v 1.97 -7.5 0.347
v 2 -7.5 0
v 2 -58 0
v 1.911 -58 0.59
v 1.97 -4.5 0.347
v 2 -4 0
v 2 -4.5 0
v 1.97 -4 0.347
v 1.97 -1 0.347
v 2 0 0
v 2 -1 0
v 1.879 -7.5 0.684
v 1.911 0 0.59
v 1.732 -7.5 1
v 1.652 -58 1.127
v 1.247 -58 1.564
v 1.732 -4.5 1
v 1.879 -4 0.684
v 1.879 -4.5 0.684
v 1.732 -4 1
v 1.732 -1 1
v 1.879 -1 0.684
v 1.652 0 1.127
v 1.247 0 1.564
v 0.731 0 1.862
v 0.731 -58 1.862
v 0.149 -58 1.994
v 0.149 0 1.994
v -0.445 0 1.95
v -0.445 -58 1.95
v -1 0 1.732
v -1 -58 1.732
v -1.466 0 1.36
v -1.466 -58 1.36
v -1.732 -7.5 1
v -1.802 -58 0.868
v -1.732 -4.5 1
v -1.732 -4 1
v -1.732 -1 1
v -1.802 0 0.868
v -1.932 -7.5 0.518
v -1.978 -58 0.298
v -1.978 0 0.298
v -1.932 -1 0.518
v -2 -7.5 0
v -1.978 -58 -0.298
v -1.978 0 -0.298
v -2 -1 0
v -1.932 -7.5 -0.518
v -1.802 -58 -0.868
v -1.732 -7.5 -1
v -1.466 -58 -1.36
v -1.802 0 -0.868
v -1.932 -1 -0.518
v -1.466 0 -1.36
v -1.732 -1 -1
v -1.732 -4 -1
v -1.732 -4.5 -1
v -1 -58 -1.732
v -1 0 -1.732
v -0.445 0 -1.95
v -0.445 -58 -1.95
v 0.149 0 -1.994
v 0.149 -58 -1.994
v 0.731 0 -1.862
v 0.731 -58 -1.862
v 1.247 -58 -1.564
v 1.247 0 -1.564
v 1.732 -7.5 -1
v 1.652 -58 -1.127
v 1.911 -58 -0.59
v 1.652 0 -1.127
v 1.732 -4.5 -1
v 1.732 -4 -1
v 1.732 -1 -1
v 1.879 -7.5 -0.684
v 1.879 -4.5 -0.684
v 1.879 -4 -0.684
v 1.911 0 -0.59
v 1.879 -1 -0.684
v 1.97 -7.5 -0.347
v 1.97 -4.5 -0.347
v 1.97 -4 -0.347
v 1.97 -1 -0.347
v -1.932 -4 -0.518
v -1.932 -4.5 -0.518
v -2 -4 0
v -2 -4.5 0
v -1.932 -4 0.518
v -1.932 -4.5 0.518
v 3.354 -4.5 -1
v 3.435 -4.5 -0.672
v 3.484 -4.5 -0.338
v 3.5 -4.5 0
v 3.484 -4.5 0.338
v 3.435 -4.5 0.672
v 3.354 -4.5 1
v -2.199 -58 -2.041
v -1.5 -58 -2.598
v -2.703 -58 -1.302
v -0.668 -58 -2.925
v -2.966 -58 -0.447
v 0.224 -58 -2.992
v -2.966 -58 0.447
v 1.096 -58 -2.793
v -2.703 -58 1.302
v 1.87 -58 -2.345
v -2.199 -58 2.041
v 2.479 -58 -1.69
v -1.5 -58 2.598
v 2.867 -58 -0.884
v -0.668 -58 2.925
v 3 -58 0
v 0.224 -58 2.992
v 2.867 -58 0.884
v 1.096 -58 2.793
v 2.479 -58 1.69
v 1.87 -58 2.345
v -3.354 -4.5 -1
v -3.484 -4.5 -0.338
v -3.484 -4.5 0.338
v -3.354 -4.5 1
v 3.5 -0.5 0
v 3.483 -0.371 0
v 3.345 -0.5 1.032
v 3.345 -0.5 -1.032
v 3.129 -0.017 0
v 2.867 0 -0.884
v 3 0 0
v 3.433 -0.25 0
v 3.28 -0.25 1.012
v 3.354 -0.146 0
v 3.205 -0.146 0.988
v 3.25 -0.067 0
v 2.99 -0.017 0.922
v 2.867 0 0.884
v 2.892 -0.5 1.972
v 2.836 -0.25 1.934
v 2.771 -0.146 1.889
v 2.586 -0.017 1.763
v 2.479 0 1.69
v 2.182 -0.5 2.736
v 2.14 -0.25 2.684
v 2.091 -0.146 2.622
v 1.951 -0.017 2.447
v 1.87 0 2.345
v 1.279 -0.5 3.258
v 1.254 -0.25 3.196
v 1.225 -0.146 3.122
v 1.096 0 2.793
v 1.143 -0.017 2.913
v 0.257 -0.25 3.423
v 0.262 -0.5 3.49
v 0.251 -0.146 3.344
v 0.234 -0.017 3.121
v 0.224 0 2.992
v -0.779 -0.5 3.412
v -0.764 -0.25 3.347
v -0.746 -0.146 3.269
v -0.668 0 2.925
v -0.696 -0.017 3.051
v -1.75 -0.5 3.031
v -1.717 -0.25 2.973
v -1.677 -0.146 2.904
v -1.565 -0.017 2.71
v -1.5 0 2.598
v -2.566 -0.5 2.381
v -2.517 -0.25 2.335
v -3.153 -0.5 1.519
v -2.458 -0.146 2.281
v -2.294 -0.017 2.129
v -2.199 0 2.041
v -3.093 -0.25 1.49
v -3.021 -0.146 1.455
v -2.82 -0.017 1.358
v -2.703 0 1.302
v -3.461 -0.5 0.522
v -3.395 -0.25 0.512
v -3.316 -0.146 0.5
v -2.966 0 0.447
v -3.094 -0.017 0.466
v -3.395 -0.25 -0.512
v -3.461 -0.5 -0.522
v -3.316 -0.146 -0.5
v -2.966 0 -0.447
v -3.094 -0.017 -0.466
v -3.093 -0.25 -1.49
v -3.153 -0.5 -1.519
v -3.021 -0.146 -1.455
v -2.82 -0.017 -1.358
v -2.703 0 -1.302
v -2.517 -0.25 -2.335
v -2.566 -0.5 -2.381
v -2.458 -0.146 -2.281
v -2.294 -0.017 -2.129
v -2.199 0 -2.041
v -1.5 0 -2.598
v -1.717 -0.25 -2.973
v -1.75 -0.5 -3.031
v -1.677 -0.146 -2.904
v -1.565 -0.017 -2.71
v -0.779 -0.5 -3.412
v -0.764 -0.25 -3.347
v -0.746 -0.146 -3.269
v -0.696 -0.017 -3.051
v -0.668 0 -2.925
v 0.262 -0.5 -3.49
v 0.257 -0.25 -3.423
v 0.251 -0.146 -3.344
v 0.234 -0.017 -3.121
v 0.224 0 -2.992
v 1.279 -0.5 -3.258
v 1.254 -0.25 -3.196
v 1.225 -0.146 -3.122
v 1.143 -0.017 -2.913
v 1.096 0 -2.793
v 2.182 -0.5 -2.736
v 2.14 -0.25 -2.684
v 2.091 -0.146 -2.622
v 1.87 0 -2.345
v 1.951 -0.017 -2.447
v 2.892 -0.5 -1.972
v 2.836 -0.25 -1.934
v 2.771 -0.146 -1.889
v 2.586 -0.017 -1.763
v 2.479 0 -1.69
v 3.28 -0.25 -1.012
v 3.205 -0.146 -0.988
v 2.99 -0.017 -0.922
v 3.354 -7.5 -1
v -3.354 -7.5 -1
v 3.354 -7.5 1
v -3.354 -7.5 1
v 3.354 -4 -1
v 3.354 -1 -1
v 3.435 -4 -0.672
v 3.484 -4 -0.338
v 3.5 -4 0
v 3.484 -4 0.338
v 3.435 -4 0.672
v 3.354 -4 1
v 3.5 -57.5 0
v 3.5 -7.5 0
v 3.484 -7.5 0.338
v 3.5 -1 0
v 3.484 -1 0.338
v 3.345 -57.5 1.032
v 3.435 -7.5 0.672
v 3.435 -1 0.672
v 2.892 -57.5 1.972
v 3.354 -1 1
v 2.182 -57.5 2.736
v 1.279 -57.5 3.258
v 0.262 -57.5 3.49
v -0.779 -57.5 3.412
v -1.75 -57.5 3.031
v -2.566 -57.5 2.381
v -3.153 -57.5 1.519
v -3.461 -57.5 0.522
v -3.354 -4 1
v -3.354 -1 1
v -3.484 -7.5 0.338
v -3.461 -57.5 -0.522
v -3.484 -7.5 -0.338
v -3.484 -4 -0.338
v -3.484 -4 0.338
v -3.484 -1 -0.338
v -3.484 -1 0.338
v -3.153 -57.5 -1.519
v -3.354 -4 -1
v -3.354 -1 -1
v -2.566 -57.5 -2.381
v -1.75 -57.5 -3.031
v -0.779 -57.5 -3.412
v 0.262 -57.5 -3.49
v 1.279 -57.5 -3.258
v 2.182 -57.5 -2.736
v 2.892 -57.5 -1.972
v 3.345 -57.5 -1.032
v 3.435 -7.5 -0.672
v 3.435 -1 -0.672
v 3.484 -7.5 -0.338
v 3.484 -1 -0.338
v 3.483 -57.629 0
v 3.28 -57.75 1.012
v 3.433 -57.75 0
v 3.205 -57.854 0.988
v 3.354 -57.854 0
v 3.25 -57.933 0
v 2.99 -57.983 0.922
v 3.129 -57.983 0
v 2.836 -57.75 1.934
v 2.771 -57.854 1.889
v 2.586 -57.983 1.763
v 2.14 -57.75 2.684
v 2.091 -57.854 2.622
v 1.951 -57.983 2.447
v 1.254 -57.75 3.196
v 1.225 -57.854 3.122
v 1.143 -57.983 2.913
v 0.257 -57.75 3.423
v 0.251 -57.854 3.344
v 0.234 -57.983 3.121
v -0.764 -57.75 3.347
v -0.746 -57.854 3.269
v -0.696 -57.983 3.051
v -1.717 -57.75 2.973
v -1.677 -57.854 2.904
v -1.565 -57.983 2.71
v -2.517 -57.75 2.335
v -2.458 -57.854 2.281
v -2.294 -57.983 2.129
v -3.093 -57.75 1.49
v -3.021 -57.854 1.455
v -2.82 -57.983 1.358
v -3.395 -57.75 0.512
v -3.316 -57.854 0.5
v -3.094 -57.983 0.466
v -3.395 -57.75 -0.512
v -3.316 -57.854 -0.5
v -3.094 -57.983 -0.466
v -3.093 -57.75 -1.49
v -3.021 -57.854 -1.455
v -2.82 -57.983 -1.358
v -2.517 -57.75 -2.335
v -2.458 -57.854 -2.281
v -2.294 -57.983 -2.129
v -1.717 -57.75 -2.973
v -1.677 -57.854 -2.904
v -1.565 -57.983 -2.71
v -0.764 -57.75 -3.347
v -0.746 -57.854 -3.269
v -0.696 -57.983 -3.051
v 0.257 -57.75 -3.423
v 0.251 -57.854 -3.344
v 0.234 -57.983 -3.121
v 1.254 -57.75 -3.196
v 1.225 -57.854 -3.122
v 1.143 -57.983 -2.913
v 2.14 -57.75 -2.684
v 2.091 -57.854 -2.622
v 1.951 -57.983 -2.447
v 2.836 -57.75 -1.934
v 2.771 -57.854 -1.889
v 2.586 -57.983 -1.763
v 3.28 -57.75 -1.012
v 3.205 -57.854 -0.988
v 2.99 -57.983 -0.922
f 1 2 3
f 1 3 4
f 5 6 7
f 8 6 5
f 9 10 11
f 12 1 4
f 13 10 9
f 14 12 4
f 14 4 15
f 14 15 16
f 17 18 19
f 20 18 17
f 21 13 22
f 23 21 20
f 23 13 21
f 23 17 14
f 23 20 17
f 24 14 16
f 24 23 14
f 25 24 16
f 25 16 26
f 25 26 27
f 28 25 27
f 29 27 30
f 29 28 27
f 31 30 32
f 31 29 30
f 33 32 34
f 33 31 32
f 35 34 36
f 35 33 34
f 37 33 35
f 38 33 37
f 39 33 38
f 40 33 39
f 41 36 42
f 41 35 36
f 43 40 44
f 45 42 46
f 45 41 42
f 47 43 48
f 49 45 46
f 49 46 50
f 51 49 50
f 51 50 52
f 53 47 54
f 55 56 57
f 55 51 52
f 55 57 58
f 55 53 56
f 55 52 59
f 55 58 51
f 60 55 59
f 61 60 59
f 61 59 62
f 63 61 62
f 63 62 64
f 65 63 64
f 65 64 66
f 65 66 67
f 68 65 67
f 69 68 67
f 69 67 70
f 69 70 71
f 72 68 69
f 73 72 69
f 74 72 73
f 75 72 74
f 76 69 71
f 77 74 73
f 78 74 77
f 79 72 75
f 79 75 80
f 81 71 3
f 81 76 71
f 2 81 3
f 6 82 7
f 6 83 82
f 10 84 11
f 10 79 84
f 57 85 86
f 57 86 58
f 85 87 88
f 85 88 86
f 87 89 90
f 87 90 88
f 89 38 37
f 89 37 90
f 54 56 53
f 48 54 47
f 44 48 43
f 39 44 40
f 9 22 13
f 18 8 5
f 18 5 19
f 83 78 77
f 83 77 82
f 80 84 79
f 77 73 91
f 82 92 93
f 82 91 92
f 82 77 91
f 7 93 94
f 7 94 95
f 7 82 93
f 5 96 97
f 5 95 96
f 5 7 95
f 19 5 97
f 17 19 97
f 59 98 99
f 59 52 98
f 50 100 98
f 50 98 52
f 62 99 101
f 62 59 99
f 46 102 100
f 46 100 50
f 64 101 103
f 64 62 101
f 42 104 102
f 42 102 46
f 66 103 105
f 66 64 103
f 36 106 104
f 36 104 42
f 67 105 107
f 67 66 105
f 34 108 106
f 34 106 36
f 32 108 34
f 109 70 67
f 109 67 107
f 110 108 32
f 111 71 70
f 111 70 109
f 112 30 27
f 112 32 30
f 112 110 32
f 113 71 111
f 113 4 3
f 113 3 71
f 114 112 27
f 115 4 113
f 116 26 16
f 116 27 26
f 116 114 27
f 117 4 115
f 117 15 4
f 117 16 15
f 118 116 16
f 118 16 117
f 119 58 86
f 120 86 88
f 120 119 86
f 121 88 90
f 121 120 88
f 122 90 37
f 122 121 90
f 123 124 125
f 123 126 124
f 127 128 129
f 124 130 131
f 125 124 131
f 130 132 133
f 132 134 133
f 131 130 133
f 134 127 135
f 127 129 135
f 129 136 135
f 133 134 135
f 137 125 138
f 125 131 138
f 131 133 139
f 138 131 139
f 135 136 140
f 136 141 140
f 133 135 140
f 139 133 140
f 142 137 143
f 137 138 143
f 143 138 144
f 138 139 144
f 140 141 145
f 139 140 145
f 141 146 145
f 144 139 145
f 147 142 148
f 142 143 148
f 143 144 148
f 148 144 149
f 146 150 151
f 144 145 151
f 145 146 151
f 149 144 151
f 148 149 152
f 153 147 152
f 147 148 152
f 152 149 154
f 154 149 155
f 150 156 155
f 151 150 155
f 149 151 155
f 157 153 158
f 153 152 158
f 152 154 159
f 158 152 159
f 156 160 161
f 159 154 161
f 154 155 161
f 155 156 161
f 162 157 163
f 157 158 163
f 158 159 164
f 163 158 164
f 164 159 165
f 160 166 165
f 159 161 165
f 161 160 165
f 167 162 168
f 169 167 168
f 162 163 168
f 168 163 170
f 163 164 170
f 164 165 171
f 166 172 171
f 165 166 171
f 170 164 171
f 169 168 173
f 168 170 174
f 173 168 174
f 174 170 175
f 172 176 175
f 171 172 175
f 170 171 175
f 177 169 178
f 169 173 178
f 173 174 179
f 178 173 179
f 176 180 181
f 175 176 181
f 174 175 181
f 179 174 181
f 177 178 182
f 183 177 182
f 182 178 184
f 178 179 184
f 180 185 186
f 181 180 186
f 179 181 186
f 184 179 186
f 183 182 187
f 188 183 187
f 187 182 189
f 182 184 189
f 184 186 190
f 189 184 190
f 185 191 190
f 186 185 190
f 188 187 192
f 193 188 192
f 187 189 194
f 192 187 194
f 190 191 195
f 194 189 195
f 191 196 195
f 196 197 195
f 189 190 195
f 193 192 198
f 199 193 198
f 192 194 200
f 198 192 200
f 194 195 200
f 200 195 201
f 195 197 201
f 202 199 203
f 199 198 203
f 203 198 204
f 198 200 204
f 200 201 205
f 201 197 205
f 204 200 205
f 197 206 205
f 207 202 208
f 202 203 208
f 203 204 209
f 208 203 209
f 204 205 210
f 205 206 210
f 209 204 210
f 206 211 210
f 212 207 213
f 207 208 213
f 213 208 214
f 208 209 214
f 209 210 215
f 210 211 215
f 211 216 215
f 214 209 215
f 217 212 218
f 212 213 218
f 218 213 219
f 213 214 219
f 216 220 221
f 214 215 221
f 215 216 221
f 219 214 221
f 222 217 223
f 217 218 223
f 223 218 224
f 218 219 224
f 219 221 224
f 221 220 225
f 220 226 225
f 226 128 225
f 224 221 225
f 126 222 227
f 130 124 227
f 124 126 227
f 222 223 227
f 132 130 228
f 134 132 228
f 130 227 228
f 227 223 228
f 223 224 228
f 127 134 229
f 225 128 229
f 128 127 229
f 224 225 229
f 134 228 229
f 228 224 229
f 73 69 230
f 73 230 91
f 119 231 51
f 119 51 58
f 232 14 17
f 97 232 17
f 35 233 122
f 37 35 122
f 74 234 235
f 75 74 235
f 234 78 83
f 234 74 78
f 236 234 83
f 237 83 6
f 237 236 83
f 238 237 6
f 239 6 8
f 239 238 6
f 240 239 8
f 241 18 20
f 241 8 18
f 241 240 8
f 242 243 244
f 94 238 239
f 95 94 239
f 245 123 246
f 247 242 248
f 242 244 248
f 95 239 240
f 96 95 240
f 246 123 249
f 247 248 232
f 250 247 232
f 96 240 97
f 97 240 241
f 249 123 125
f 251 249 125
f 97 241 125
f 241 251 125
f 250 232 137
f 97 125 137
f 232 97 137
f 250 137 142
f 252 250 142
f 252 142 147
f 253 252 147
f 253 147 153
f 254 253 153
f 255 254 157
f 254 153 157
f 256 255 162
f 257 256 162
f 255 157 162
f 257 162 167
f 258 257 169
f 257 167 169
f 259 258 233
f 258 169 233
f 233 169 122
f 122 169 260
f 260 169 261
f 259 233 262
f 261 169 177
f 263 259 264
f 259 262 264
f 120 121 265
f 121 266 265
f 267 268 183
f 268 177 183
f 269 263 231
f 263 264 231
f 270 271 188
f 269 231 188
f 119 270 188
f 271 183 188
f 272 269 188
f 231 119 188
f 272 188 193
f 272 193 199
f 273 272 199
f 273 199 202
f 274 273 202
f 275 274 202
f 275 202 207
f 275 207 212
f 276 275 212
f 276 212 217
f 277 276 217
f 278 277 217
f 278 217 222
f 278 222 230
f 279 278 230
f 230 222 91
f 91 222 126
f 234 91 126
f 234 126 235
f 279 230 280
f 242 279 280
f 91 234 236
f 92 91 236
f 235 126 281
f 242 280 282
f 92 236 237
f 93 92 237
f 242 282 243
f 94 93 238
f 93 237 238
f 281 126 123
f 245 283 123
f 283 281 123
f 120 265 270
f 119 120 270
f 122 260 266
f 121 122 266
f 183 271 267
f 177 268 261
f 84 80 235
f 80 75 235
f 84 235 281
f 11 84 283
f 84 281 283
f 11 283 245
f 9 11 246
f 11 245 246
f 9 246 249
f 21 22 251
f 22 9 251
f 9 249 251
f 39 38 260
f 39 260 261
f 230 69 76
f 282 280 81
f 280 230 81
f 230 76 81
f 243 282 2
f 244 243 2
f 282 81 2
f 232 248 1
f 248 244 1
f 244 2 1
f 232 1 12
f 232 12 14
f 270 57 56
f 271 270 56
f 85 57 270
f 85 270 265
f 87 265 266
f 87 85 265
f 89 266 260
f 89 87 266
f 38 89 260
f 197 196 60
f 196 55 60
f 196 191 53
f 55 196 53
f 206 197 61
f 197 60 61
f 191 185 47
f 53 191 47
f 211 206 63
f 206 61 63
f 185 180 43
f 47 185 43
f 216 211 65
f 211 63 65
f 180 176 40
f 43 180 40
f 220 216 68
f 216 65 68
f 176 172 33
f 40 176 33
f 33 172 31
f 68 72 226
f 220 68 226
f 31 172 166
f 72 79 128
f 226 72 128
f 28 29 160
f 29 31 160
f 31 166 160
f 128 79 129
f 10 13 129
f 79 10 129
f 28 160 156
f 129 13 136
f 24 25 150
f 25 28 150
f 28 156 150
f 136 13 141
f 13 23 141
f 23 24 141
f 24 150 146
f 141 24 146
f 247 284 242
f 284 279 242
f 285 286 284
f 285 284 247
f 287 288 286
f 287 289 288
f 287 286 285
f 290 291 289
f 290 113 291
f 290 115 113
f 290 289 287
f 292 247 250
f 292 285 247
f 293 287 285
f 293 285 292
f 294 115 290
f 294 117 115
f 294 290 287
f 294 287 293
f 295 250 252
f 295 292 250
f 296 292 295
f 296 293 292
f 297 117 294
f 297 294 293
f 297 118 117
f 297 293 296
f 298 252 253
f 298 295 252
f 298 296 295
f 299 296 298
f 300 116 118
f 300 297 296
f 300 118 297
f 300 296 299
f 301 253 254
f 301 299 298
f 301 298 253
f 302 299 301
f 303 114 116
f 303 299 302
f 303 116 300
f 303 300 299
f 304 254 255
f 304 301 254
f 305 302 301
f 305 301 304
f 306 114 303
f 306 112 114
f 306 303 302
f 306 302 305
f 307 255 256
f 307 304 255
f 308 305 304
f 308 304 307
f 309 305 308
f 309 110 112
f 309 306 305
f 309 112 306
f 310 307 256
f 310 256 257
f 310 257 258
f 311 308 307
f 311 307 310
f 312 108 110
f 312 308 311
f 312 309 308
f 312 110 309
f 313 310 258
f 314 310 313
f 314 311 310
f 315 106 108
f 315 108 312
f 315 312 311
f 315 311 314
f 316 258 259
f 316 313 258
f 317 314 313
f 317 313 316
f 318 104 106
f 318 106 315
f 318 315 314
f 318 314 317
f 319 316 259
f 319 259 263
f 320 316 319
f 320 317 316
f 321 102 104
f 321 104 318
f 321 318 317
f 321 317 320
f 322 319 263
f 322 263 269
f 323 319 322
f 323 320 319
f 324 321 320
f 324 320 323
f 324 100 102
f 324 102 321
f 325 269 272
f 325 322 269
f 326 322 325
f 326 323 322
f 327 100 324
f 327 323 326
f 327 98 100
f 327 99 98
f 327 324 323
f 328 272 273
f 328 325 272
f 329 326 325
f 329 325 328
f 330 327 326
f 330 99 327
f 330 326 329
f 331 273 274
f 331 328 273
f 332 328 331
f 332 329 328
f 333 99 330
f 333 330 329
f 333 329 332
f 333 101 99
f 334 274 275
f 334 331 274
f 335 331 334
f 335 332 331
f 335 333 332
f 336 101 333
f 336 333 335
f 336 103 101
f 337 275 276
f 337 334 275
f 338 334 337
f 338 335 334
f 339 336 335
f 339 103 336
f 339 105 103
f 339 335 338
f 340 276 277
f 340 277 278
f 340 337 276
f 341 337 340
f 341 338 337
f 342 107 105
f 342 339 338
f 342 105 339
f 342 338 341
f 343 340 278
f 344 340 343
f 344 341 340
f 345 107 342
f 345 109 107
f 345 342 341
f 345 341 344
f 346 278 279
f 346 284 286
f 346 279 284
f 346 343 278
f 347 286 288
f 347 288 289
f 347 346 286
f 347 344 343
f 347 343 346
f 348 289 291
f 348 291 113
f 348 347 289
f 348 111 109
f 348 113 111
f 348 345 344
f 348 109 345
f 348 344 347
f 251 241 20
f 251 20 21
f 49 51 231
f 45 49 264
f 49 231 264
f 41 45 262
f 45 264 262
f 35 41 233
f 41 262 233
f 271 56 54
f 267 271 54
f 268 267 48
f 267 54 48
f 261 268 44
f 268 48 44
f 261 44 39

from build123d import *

# Parameters (mm, degrees)
F0_R     = 3.5
F0_R_2   = 2
F1_DEPTH = 58
F2_R     = 0.5
F3_W     = 3
F3_H     = 2
F4_DEPTH = 12.5


with BuildPart() as f1:
    # F0 (on Front) → F1 (new body)
    with BuildSketch(Plane.XZ):
        Circle(F0_R)
        Circle(F0_R_2, mode=Mode.SUBTRACT)
    extrude(amount=F1_DEPTH)

    # F2
    f2_edges = [f1.edges().sort_by_distance(p)[0] for p in [
        (-3.5, -58, 0),
        (-3.5, 0, 0),
    ]]
    fillet(f2_edges, radius=F2_R)

    # F3 (on Right) → F4 (cut, symmetric)
    with BuildSketch(Plane.YZ):
        with Locations((-6, 0)):
            Rectangle(F3_W, F3_H)
        with Locations((-2.5, 0)):
            Rectangle(F3_W, F3_H)
    extrude(amount=F4_DEPTH, both=True, mode=Mode.SUBTRACT)


solid = f1.part
